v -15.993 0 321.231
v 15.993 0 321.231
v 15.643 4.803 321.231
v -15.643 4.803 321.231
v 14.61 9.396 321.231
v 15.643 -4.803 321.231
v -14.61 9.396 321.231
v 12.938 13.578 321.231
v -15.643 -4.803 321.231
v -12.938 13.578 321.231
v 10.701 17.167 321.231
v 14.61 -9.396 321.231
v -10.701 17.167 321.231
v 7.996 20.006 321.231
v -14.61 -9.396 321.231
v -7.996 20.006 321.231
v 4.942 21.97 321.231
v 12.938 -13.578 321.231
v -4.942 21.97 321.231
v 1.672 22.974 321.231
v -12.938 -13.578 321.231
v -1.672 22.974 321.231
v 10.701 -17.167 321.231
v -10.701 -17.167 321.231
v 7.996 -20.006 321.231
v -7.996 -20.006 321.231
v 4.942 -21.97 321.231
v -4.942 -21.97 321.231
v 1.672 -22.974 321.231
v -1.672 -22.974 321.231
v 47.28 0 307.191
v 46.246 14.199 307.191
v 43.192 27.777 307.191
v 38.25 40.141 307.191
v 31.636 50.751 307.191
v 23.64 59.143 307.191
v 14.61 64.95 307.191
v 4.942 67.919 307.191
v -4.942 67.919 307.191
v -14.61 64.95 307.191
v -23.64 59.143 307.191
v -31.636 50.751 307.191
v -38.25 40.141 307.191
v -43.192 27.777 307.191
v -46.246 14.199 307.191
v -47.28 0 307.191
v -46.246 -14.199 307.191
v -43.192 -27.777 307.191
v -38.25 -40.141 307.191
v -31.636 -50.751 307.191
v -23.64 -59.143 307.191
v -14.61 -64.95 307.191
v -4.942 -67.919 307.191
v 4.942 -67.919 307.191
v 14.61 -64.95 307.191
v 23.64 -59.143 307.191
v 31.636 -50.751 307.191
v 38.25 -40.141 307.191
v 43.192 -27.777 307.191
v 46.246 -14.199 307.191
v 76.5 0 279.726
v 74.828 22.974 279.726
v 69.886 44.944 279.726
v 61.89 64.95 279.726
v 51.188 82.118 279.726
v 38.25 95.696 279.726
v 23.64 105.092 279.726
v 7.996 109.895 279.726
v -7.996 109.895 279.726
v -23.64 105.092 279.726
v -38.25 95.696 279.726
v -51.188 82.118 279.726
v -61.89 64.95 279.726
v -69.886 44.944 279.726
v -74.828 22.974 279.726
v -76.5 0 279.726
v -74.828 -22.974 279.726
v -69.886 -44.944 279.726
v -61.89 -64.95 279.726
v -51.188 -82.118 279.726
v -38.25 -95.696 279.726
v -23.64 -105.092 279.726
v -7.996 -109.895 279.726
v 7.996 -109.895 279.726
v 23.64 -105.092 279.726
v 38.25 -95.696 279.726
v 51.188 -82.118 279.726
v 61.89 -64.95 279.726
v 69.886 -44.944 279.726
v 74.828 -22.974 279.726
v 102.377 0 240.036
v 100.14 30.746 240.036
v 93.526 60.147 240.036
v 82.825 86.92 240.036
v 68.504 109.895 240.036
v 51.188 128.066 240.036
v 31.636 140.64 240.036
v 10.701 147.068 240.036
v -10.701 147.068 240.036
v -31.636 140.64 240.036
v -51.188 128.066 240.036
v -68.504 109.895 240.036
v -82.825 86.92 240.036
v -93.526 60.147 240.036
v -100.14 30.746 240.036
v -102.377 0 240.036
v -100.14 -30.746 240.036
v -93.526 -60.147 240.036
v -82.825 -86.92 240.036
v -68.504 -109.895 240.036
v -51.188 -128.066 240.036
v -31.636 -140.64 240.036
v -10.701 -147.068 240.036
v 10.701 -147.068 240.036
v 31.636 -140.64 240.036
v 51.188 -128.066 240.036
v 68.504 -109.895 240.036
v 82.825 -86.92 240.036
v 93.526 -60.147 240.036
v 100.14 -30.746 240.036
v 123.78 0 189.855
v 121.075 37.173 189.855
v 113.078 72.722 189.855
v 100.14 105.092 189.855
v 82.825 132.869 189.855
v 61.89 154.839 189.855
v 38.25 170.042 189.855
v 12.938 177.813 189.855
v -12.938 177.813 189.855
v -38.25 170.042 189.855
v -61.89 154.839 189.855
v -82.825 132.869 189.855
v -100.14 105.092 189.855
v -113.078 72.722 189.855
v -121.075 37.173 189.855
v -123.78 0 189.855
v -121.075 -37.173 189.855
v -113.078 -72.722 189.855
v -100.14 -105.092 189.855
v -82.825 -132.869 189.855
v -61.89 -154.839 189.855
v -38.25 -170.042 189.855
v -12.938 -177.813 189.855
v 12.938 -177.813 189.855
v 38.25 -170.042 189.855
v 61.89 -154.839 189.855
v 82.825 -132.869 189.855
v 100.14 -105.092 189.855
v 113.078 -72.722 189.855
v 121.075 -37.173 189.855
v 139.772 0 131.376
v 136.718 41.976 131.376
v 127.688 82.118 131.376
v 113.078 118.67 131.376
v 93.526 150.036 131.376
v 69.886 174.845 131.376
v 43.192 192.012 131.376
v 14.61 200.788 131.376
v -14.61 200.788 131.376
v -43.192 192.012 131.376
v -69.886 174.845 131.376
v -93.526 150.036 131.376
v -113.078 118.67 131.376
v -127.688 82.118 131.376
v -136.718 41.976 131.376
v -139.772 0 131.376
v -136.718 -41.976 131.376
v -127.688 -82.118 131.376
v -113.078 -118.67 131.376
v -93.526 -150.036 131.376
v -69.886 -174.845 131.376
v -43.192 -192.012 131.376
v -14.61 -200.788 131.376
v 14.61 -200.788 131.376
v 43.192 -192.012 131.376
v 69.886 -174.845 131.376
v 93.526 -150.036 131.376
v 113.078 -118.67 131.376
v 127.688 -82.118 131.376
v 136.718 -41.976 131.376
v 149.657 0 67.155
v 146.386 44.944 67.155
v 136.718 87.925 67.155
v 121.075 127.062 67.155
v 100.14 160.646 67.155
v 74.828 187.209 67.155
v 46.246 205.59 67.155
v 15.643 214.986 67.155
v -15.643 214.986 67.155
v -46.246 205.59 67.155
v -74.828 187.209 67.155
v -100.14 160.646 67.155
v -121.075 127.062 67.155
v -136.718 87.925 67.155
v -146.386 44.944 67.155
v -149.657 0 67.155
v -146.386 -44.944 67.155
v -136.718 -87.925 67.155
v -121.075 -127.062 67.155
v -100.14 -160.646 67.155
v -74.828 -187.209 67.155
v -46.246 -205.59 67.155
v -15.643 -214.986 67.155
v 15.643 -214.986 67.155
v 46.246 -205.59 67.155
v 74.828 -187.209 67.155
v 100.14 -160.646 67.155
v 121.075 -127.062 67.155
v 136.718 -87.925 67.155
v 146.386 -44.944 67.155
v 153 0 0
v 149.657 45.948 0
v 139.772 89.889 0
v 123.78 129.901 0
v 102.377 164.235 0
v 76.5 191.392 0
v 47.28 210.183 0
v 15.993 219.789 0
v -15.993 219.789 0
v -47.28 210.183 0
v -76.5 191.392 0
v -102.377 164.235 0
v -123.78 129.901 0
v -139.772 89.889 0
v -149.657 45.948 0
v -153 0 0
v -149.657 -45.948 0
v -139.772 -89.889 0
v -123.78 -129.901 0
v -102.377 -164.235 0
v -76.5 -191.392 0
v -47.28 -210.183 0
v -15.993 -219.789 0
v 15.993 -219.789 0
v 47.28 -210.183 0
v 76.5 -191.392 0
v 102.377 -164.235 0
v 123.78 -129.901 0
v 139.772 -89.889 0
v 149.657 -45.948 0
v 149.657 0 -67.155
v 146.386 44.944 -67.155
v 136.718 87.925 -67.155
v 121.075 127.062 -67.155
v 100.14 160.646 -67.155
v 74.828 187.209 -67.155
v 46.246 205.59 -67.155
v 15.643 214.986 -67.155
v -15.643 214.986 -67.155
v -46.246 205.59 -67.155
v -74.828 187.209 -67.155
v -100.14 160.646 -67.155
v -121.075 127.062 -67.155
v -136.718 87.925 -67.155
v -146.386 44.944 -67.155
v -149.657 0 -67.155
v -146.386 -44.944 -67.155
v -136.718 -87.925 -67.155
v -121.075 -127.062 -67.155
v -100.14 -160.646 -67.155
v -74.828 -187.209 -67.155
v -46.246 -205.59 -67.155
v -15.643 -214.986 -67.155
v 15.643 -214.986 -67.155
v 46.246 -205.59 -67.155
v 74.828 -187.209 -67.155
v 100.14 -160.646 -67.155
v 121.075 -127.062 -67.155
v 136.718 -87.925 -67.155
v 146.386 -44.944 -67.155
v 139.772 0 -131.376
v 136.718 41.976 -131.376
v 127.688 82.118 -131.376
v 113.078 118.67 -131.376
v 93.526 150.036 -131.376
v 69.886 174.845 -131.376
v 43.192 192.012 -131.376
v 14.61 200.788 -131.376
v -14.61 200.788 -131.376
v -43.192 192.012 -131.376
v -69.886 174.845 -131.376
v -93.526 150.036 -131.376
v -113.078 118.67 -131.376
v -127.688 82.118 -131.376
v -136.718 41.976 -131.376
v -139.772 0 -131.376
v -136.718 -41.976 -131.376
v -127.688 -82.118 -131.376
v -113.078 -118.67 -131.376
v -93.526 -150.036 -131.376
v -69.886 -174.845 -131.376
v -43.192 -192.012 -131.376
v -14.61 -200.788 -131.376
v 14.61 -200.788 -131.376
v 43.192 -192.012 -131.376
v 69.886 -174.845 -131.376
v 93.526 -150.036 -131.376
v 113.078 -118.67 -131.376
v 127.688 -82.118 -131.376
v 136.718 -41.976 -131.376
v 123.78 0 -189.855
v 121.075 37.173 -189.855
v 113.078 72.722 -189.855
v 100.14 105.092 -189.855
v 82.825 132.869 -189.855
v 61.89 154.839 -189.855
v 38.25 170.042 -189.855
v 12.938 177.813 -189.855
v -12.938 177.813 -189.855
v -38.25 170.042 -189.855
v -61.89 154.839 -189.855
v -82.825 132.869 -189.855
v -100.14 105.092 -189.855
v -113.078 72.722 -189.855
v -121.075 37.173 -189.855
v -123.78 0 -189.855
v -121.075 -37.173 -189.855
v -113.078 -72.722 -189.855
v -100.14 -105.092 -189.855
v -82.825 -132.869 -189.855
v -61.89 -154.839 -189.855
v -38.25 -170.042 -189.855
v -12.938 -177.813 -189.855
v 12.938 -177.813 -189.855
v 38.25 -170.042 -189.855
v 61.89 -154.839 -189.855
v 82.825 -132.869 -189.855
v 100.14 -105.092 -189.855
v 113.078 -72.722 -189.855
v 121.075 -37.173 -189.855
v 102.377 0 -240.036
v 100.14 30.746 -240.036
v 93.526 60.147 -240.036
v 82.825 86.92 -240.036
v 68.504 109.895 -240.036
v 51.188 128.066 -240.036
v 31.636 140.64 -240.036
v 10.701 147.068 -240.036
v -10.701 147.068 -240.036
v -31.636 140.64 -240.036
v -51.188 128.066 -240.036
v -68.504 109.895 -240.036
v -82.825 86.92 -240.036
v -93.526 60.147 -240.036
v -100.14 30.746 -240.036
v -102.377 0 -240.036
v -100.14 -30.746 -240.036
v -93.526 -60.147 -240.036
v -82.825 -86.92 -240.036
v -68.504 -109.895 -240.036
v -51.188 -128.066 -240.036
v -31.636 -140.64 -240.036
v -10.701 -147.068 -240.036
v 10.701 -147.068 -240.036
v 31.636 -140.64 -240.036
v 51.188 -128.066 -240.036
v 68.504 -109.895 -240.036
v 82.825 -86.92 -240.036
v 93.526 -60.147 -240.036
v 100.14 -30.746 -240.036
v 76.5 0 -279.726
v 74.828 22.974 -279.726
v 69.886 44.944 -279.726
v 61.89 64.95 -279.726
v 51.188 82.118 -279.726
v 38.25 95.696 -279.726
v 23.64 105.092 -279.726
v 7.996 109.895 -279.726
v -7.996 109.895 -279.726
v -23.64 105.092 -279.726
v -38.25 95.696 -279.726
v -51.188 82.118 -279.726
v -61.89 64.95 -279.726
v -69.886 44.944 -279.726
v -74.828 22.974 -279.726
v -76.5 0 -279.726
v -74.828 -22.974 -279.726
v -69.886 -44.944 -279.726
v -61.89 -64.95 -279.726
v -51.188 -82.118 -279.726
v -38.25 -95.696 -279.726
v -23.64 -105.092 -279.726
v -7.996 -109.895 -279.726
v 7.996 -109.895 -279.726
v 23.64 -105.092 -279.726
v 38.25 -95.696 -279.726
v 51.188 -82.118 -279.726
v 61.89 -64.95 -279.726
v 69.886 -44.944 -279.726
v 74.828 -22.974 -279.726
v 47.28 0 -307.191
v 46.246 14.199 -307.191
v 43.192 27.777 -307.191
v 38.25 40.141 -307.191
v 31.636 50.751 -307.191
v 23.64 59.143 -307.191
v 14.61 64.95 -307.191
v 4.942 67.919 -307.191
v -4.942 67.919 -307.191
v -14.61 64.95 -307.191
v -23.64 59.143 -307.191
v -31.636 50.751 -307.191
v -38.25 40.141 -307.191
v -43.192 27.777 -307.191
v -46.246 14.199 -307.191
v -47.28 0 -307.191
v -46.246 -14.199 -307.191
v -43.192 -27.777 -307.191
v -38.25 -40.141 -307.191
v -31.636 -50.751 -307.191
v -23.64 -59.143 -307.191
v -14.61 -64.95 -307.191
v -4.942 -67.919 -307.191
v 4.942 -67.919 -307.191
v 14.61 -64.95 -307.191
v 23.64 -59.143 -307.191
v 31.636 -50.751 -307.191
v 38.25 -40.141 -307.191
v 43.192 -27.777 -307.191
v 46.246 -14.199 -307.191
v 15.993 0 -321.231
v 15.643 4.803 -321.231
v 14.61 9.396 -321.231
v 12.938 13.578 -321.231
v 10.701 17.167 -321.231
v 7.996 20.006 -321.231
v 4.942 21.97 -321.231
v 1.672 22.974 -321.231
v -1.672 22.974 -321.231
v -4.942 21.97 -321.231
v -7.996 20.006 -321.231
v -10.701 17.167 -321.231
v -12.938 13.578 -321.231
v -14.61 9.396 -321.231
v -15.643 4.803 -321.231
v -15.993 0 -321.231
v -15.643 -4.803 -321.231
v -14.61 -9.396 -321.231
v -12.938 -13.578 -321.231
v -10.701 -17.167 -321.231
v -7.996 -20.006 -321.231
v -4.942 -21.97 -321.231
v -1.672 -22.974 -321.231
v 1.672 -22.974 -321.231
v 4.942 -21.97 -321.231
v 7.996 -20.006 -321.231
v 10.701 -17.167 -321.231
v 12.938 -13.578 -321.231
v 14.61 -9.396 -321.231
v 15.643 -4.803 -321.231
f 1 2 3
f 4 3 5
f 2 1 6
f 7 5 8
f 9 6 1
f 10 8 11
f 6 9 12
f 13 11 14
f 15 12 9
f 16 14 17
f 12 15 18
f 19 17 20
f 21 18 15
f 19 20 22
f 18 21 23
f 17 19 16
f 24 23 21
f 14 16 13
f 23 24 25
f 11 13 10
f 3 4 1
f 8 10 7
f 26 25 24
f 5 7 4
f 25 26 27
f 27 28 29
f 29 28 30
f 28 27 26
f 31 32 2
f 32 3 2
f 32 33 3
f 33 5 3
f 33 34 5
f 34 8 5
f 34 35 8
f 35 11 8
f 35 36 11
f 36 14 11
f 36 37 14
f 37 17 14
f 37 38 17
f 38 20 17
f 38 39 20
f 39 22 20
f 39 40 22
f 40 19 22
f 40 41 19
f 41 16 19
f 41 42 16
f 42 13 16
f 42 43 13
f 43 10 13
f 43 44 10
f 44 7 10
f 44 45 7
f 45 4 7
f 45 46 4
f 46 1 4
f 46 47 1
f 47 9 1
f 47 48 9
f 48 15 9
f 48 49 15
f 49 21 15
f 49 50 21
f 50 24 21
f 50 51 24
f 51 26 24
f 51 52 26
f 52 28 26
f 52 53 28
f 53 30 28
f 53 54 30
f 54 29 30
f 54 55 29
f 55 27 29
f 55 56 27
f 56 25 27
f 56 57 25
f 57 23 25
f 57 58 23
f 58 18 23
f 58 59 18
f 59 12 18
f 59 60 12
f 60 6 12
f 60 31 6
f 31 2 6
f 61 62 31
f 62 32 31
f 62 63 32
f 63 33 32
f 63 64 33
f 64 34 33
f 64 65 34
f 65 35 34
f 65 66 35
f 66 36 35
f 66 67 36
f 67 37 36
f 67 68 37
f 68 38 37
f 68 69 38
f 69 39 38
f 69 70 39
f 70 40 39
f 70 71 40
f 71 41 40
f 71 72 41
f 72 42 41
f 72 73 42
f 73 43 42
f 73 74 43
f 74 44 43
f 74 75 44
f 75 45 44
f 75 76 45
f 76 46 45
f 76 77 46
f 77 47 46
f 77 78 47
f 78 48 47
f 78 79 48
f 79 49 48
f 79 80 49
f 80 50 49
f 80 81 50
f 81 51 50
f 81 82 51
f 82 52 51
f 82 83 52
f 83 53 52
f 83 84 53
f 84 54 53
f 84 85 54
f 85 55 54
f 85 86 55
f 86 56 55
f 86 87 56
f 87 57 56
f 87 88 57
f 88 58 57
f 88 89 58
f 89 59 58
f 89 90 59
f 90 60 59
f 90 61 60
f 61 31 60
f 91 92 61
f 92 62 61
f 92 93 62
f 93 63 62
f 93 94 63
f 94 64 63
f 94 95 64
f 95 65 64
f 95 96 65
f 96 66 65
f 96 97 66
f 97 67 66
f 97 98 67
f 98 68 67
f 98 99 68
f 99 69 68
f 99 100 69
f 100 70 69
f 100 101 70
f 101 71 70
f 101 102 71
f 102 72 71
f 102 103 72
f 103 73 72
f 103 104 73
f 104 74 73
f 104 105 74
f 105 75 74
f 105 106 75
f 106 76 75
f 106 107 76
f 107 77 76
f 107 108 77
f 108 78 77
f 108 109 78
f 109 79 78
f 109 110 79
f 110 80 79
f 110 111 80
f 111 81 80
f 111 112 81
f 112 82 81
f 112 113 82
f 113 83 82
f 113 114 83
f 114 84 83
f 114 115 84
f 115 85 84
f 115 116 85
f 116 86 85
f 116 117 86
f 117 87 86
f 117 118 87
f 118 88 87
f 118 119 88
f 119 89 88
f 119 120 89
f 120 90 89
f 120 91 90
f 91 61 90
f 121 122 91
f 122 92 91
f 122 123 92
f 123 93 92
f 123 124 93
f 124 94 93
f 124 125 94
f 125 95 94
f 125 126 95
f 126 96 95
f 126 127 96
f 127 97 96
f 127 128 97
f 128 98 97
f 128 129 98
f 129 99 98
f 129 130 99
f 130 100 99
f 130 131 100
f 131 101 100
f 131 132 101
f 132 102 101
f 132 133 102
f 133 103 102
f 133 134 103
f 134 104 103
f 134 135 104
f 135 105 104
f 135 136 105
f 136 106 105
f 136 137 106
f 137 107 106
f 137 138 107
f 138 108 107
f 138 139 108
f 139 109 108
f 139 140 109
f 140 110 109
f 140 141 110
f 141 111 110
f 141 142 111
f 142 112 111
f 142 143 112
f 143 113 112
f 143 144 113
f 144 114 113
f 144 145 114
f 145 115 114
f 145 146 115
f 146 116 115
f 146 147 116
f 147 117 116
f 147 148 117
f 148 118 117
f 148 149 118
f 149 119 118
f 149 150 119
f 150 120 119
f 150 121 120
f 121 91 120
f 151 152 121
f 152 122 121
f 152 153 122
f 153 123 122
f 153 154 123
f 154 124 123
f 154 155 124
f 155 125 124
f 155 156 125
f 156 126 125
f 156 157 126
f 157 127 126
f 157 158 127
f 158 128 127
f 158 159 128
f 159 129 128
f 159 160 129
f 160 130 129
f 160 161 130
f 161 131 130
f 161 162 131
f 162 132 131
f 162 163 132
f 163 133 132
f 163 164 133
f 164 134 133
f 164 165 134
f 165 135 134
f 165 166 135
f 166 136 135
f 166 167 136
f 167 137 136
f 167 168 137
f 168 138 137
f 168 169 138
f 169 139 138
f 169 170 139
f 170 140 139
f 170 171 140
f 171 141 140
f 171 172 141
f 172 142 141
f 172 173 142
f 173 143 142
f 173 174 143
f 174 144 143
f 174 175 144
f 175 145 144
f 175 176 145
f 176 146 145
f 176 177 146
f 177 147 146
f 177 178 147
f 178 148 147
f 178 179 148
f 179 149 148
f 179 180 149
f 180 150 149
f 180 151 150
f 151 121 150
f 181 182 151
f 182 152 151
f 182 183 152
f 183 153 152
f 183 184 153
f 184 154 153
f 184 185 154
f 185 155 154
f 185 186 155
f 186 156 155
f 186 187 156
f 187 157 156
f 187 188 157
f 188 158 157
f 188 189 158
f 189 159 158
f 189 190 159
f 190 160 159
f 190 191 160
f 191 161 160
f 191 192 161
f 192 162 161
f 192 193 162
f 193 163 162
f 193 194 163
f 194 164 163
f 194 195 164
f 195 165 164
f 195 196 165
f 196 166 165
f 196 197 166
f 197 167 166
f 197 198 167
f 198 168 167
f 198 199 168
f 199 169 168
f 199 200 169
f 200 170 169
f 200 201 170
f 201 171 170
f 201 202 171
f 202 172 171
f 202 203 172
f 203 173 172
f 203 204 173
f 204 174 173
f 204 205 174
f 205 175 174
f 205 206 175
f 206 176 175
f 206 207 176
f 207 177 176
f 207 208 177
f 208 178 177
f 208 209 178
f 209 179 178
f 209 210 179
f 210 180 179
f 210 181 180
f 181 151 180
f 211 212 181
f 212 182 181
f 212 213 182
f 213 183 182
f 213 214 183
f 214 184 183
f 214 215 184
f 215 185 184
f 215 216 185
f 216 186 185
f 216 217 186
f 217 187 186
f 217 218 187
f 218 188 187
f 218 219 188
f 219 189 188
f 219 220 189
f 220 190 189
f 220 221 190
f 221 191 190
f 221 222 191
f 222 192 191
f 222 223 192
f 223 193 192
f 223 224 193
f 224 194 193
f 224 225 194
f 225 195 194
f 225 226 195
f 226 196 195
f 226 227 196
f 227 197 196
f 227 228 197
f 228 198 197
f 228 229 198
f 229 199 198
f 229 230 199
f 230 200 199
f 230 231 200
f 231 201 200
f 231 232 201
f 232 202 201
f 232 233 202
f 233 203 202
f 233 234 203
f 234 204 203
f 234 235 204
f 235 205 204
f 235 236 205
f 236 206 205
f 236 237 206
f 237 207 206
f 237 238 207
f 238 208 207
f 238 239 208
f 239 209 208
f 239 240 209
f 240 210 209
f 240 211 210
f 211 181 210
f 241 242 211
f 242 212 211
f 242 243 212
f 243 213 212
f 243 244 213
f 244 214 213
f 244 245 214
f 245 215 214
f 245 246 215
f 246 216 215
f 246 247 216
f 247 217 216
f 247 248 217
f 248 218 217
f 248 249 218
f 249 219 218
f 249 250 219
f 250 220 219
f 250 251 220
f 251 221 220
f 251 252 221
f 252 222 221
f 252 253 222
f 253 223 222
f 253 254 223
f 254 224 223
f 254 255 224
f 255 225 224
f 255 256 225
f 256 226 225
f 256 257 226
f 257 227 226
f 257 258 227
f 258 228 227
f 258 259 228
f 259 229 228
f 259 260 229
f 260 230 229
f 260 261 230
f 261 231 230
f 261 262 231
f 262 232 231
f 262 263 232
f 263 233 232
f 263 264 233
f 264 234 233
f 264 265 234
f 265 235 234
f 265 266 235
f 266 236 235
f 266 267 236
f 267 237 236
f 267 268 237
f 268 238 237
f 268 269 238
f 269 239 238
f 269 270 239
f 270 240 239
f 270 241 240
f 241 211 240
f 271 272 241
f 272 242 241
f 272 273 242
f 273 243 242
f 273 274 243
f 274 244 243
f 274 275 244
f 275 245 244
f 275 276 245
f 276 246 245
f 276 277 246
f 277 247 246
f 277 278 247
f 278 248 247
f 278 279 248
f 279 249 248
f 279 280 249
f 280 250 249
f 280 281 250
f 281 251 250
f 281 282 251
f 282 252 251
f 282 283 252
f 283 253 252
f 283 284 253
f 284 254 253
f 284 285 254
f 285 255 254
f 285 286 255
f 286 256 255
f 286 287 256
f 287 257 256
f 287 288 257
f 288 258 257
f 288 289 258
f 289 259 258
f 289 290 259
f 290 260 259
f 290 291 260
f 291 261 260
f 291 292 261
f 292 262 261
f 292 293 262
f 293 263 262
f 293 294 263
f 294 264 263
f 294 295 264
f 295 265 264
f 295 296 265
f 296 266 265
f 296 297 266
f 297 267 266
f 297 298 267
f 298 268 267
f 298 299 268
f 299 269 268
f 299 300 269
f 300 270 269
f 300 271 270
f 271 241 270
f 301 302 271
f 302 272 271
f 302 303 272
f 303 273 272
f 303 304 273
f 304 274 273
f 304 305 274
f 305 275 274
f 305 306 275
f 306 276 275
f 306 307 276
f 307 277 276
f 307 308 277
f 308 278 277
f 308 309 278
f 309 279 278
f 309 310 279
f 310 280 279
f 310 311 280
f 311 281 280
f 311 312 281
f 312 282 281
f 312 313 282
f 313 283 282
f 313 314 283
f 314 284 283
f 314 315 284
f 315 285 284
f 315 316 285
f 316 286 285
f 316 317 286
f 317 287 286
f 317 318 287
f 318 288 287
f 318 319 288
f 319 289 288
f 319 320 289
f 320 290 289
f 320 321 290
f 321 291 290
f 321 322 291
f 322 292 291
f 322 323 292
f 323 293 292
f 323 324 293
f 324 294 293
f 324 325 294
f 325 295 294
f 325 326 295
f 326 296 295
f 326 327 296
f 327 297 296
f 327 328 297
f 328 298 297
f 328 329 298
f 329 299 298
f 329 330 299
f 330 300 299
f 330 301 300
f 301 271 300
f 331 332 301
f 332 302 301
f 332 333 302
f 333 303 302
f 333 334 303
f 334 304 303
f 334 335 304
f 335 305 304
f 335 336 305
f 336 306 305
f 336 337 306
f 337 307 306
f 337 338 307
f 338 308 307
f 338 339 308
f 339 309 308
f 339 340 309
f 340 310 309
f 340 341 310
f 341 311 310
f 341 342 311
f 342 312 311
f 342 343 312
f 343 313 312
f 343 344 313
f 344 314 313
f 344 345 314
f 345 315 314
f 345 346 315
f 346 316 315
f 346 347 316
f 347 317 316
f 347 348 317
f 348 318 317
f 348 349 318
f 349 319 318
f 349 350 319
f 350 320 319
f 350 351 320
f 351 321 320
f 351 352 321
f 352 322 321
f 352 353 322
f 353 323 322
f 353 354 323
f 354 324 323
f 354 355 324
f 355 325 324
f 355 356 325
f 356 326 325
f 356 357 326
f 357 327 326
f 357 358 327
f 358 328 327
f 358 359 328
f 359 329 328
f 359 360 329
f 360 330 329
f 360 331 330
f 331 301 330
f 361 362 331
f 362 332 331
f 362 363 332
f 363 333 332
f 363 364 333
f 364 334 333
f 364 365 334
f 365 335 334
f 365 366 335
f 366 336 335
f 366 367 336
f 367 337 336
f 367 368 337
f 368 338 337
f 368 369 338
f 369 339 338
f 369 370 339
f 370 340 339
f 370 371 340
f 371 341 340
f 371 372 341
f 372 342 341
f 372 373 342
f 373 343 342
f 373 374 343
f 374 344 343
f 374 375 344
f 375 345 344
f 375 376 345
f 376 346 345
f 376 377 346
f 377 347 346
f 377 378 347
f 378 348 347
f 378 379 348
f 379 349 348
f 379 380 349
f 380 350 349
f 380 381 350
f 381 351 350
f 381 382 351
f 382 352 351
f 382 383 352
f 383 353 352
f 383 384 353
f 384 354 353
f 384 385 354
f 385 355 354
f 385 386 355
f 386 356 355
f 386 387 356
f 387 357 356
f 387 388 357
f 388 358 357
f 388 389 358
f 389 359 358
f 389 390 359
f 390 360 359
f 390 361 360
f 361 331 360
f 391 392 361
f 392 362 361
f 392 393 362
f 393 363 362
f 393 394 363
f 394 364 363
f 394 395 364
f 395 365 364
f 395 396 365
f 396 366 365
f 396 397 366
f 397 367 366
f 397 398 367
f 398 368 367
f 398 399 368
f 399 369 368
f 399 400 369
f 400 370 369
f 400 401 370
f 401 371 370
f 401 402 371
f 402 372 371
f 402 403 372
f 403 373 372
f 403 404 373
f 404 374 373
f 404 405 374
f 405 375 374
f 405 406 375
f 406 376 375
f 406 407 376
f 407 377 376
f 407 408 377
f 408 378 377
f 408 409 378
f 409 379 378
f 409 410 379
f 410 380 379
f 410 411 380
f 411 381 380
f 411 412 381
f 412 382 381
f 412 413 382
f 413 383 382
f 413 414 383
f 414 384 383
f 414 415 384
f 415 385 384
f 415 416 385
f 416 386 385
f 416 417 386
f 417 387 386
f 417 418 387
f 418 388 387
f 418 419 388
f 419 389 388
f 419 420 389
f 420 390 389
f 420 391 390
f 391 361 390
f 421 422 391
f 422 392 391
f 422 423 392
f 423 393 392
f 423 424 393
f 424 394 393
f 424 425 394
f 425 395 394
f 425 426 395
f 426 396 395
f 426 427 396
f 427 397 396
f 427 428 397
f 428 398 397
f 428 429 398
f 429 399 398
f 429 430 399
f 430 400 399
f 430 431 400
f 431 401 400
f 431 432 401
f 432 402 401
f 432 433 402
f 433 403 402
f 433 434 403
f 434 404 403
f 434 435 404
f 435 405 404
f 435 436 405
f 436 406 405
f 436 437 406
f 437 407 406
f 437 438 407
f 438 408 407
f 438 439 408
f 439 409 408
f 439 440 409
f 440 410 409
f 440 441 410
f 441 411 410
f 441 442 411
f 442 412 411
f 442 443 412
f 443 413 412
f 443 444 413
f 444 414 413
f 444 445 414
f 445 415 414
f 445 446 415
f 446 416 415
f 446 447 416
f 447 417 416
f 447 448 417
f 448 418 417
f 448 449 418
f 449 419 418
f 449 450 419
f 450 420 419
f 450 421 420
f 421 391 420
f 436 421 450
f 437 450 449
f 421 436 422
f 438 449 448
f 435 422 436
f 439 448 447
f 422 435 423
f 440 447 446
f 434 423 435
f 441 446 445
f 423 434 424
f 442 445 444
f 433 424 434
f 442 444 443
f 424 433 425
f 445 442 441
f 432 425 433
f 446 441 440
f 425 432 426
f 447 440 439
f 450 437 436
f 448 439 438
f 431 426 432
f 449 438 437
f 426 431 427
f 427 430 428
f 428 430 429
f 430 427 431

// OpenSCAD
// Generated by SolidPython 1.0.1 on 2020-07-29 00:46:49


scale(v = [9, 13, 19]) {
	sphere(r = 17);
}
/***********************************************
*********      SolidPython code:      **********
************************************************
 
# import packages: SolidPython
from solid import *
from solid.utils import *
from itertools import chain, combinations, permutations


class Resize:

    def __init__(self, scad_file):
        self.scad_file = scad_file
        #self.scad_file = import_scad(scad_file)
        # cone/cylinder param:
        self.r1 = 0
        self.r2 = 0
        self.h = 0
        # rectangular prism param:
        self.w = 0
        self.l = 0
        # ellipse param:
        self.r = 0

    # import OpenScad code (file name corresponds to shape)


    # classify shape + parameters
    def assign(self, param1, param2, param3):
        if self.scad_file == 'cone.scad':
            self.r1 = param1
            self.r2 = param2
            self.h = param3
        elif self.scad_file == 'cylinder.scad':
            self.r1 = param1
            self.r2 = param2
            self.h = param3
        elif self.scad_file == 'rectangularPrism.scad':
            self.h = param1
            self.l = param2
            self.w = param3
        else:
            self.r = param1
            self.h = param2

    # resize parameters
    def iterate(self):
        x = range(3, 20, 2)
        i = 1
        if self.scad_file == 'cone.scad':
            tempList = list(permutations(x, 2))
            for temp in tempList:
                param1 = temp[0]
                param2 = temp[1]
                filepath = 'produced_scad_files/' + 'cone' + str(param1) + '_' + str(param2) + '_' + '.scad'
                scad_render_to_file(cylinder(h=param1, r1=param2, r2=0), filepath)

        elif self.scad_file == 'cylinder.scad':
            tempList = list(permutations(x, 3))
            for temp in tempList:
                param1 = temp[0]
                param2 = temp[1]
                filepath = 'produced_scad_files/' + 'cylinder' + str(param1) + '_' + str(param2) + '_' + '.scad'
                scad_render_to_file(cylinder(h=param1, r1=param2, r2=param2), filepath)

        elif self.scad_file == 'rectangularPrism.scad':
            tempList = list(permutations(x, 3))
            for temp in tempList:
                param1 = temp[0]
                param2 = temp[1]
                param3 = temp[2]
                filepath = 'produced_scad_files/' + 'rectangularPrism' + str(param1) + '_' + str(param2) + '_' + str(
                    param3) + '.scad'
                scad_render_to_file(cube(size=(param1, param2, param3)), filepath)

        elif self.scad_file == 'ellipse.scad':
            tempList = list(permutations(x, 4))
            for temp in tempList:
                param1 = temp[0]
                param2 = temp[1]
                param3 = temp[2]
                param4 = temp[3]
                filepath = 'produced_scad_files/' + 'ellipse' + str(param1) + '_' + str(param2) + '_' + str(param3) + '_' + str(param4) + '.scad'
                scad_render_to_file(scale([param1, param2, param3])(sphere(r=param4)), filepath)

    def render_to_scadfile(self):
        scad_render_to_file(scad, 'example.scad') 
 
************************************************/
